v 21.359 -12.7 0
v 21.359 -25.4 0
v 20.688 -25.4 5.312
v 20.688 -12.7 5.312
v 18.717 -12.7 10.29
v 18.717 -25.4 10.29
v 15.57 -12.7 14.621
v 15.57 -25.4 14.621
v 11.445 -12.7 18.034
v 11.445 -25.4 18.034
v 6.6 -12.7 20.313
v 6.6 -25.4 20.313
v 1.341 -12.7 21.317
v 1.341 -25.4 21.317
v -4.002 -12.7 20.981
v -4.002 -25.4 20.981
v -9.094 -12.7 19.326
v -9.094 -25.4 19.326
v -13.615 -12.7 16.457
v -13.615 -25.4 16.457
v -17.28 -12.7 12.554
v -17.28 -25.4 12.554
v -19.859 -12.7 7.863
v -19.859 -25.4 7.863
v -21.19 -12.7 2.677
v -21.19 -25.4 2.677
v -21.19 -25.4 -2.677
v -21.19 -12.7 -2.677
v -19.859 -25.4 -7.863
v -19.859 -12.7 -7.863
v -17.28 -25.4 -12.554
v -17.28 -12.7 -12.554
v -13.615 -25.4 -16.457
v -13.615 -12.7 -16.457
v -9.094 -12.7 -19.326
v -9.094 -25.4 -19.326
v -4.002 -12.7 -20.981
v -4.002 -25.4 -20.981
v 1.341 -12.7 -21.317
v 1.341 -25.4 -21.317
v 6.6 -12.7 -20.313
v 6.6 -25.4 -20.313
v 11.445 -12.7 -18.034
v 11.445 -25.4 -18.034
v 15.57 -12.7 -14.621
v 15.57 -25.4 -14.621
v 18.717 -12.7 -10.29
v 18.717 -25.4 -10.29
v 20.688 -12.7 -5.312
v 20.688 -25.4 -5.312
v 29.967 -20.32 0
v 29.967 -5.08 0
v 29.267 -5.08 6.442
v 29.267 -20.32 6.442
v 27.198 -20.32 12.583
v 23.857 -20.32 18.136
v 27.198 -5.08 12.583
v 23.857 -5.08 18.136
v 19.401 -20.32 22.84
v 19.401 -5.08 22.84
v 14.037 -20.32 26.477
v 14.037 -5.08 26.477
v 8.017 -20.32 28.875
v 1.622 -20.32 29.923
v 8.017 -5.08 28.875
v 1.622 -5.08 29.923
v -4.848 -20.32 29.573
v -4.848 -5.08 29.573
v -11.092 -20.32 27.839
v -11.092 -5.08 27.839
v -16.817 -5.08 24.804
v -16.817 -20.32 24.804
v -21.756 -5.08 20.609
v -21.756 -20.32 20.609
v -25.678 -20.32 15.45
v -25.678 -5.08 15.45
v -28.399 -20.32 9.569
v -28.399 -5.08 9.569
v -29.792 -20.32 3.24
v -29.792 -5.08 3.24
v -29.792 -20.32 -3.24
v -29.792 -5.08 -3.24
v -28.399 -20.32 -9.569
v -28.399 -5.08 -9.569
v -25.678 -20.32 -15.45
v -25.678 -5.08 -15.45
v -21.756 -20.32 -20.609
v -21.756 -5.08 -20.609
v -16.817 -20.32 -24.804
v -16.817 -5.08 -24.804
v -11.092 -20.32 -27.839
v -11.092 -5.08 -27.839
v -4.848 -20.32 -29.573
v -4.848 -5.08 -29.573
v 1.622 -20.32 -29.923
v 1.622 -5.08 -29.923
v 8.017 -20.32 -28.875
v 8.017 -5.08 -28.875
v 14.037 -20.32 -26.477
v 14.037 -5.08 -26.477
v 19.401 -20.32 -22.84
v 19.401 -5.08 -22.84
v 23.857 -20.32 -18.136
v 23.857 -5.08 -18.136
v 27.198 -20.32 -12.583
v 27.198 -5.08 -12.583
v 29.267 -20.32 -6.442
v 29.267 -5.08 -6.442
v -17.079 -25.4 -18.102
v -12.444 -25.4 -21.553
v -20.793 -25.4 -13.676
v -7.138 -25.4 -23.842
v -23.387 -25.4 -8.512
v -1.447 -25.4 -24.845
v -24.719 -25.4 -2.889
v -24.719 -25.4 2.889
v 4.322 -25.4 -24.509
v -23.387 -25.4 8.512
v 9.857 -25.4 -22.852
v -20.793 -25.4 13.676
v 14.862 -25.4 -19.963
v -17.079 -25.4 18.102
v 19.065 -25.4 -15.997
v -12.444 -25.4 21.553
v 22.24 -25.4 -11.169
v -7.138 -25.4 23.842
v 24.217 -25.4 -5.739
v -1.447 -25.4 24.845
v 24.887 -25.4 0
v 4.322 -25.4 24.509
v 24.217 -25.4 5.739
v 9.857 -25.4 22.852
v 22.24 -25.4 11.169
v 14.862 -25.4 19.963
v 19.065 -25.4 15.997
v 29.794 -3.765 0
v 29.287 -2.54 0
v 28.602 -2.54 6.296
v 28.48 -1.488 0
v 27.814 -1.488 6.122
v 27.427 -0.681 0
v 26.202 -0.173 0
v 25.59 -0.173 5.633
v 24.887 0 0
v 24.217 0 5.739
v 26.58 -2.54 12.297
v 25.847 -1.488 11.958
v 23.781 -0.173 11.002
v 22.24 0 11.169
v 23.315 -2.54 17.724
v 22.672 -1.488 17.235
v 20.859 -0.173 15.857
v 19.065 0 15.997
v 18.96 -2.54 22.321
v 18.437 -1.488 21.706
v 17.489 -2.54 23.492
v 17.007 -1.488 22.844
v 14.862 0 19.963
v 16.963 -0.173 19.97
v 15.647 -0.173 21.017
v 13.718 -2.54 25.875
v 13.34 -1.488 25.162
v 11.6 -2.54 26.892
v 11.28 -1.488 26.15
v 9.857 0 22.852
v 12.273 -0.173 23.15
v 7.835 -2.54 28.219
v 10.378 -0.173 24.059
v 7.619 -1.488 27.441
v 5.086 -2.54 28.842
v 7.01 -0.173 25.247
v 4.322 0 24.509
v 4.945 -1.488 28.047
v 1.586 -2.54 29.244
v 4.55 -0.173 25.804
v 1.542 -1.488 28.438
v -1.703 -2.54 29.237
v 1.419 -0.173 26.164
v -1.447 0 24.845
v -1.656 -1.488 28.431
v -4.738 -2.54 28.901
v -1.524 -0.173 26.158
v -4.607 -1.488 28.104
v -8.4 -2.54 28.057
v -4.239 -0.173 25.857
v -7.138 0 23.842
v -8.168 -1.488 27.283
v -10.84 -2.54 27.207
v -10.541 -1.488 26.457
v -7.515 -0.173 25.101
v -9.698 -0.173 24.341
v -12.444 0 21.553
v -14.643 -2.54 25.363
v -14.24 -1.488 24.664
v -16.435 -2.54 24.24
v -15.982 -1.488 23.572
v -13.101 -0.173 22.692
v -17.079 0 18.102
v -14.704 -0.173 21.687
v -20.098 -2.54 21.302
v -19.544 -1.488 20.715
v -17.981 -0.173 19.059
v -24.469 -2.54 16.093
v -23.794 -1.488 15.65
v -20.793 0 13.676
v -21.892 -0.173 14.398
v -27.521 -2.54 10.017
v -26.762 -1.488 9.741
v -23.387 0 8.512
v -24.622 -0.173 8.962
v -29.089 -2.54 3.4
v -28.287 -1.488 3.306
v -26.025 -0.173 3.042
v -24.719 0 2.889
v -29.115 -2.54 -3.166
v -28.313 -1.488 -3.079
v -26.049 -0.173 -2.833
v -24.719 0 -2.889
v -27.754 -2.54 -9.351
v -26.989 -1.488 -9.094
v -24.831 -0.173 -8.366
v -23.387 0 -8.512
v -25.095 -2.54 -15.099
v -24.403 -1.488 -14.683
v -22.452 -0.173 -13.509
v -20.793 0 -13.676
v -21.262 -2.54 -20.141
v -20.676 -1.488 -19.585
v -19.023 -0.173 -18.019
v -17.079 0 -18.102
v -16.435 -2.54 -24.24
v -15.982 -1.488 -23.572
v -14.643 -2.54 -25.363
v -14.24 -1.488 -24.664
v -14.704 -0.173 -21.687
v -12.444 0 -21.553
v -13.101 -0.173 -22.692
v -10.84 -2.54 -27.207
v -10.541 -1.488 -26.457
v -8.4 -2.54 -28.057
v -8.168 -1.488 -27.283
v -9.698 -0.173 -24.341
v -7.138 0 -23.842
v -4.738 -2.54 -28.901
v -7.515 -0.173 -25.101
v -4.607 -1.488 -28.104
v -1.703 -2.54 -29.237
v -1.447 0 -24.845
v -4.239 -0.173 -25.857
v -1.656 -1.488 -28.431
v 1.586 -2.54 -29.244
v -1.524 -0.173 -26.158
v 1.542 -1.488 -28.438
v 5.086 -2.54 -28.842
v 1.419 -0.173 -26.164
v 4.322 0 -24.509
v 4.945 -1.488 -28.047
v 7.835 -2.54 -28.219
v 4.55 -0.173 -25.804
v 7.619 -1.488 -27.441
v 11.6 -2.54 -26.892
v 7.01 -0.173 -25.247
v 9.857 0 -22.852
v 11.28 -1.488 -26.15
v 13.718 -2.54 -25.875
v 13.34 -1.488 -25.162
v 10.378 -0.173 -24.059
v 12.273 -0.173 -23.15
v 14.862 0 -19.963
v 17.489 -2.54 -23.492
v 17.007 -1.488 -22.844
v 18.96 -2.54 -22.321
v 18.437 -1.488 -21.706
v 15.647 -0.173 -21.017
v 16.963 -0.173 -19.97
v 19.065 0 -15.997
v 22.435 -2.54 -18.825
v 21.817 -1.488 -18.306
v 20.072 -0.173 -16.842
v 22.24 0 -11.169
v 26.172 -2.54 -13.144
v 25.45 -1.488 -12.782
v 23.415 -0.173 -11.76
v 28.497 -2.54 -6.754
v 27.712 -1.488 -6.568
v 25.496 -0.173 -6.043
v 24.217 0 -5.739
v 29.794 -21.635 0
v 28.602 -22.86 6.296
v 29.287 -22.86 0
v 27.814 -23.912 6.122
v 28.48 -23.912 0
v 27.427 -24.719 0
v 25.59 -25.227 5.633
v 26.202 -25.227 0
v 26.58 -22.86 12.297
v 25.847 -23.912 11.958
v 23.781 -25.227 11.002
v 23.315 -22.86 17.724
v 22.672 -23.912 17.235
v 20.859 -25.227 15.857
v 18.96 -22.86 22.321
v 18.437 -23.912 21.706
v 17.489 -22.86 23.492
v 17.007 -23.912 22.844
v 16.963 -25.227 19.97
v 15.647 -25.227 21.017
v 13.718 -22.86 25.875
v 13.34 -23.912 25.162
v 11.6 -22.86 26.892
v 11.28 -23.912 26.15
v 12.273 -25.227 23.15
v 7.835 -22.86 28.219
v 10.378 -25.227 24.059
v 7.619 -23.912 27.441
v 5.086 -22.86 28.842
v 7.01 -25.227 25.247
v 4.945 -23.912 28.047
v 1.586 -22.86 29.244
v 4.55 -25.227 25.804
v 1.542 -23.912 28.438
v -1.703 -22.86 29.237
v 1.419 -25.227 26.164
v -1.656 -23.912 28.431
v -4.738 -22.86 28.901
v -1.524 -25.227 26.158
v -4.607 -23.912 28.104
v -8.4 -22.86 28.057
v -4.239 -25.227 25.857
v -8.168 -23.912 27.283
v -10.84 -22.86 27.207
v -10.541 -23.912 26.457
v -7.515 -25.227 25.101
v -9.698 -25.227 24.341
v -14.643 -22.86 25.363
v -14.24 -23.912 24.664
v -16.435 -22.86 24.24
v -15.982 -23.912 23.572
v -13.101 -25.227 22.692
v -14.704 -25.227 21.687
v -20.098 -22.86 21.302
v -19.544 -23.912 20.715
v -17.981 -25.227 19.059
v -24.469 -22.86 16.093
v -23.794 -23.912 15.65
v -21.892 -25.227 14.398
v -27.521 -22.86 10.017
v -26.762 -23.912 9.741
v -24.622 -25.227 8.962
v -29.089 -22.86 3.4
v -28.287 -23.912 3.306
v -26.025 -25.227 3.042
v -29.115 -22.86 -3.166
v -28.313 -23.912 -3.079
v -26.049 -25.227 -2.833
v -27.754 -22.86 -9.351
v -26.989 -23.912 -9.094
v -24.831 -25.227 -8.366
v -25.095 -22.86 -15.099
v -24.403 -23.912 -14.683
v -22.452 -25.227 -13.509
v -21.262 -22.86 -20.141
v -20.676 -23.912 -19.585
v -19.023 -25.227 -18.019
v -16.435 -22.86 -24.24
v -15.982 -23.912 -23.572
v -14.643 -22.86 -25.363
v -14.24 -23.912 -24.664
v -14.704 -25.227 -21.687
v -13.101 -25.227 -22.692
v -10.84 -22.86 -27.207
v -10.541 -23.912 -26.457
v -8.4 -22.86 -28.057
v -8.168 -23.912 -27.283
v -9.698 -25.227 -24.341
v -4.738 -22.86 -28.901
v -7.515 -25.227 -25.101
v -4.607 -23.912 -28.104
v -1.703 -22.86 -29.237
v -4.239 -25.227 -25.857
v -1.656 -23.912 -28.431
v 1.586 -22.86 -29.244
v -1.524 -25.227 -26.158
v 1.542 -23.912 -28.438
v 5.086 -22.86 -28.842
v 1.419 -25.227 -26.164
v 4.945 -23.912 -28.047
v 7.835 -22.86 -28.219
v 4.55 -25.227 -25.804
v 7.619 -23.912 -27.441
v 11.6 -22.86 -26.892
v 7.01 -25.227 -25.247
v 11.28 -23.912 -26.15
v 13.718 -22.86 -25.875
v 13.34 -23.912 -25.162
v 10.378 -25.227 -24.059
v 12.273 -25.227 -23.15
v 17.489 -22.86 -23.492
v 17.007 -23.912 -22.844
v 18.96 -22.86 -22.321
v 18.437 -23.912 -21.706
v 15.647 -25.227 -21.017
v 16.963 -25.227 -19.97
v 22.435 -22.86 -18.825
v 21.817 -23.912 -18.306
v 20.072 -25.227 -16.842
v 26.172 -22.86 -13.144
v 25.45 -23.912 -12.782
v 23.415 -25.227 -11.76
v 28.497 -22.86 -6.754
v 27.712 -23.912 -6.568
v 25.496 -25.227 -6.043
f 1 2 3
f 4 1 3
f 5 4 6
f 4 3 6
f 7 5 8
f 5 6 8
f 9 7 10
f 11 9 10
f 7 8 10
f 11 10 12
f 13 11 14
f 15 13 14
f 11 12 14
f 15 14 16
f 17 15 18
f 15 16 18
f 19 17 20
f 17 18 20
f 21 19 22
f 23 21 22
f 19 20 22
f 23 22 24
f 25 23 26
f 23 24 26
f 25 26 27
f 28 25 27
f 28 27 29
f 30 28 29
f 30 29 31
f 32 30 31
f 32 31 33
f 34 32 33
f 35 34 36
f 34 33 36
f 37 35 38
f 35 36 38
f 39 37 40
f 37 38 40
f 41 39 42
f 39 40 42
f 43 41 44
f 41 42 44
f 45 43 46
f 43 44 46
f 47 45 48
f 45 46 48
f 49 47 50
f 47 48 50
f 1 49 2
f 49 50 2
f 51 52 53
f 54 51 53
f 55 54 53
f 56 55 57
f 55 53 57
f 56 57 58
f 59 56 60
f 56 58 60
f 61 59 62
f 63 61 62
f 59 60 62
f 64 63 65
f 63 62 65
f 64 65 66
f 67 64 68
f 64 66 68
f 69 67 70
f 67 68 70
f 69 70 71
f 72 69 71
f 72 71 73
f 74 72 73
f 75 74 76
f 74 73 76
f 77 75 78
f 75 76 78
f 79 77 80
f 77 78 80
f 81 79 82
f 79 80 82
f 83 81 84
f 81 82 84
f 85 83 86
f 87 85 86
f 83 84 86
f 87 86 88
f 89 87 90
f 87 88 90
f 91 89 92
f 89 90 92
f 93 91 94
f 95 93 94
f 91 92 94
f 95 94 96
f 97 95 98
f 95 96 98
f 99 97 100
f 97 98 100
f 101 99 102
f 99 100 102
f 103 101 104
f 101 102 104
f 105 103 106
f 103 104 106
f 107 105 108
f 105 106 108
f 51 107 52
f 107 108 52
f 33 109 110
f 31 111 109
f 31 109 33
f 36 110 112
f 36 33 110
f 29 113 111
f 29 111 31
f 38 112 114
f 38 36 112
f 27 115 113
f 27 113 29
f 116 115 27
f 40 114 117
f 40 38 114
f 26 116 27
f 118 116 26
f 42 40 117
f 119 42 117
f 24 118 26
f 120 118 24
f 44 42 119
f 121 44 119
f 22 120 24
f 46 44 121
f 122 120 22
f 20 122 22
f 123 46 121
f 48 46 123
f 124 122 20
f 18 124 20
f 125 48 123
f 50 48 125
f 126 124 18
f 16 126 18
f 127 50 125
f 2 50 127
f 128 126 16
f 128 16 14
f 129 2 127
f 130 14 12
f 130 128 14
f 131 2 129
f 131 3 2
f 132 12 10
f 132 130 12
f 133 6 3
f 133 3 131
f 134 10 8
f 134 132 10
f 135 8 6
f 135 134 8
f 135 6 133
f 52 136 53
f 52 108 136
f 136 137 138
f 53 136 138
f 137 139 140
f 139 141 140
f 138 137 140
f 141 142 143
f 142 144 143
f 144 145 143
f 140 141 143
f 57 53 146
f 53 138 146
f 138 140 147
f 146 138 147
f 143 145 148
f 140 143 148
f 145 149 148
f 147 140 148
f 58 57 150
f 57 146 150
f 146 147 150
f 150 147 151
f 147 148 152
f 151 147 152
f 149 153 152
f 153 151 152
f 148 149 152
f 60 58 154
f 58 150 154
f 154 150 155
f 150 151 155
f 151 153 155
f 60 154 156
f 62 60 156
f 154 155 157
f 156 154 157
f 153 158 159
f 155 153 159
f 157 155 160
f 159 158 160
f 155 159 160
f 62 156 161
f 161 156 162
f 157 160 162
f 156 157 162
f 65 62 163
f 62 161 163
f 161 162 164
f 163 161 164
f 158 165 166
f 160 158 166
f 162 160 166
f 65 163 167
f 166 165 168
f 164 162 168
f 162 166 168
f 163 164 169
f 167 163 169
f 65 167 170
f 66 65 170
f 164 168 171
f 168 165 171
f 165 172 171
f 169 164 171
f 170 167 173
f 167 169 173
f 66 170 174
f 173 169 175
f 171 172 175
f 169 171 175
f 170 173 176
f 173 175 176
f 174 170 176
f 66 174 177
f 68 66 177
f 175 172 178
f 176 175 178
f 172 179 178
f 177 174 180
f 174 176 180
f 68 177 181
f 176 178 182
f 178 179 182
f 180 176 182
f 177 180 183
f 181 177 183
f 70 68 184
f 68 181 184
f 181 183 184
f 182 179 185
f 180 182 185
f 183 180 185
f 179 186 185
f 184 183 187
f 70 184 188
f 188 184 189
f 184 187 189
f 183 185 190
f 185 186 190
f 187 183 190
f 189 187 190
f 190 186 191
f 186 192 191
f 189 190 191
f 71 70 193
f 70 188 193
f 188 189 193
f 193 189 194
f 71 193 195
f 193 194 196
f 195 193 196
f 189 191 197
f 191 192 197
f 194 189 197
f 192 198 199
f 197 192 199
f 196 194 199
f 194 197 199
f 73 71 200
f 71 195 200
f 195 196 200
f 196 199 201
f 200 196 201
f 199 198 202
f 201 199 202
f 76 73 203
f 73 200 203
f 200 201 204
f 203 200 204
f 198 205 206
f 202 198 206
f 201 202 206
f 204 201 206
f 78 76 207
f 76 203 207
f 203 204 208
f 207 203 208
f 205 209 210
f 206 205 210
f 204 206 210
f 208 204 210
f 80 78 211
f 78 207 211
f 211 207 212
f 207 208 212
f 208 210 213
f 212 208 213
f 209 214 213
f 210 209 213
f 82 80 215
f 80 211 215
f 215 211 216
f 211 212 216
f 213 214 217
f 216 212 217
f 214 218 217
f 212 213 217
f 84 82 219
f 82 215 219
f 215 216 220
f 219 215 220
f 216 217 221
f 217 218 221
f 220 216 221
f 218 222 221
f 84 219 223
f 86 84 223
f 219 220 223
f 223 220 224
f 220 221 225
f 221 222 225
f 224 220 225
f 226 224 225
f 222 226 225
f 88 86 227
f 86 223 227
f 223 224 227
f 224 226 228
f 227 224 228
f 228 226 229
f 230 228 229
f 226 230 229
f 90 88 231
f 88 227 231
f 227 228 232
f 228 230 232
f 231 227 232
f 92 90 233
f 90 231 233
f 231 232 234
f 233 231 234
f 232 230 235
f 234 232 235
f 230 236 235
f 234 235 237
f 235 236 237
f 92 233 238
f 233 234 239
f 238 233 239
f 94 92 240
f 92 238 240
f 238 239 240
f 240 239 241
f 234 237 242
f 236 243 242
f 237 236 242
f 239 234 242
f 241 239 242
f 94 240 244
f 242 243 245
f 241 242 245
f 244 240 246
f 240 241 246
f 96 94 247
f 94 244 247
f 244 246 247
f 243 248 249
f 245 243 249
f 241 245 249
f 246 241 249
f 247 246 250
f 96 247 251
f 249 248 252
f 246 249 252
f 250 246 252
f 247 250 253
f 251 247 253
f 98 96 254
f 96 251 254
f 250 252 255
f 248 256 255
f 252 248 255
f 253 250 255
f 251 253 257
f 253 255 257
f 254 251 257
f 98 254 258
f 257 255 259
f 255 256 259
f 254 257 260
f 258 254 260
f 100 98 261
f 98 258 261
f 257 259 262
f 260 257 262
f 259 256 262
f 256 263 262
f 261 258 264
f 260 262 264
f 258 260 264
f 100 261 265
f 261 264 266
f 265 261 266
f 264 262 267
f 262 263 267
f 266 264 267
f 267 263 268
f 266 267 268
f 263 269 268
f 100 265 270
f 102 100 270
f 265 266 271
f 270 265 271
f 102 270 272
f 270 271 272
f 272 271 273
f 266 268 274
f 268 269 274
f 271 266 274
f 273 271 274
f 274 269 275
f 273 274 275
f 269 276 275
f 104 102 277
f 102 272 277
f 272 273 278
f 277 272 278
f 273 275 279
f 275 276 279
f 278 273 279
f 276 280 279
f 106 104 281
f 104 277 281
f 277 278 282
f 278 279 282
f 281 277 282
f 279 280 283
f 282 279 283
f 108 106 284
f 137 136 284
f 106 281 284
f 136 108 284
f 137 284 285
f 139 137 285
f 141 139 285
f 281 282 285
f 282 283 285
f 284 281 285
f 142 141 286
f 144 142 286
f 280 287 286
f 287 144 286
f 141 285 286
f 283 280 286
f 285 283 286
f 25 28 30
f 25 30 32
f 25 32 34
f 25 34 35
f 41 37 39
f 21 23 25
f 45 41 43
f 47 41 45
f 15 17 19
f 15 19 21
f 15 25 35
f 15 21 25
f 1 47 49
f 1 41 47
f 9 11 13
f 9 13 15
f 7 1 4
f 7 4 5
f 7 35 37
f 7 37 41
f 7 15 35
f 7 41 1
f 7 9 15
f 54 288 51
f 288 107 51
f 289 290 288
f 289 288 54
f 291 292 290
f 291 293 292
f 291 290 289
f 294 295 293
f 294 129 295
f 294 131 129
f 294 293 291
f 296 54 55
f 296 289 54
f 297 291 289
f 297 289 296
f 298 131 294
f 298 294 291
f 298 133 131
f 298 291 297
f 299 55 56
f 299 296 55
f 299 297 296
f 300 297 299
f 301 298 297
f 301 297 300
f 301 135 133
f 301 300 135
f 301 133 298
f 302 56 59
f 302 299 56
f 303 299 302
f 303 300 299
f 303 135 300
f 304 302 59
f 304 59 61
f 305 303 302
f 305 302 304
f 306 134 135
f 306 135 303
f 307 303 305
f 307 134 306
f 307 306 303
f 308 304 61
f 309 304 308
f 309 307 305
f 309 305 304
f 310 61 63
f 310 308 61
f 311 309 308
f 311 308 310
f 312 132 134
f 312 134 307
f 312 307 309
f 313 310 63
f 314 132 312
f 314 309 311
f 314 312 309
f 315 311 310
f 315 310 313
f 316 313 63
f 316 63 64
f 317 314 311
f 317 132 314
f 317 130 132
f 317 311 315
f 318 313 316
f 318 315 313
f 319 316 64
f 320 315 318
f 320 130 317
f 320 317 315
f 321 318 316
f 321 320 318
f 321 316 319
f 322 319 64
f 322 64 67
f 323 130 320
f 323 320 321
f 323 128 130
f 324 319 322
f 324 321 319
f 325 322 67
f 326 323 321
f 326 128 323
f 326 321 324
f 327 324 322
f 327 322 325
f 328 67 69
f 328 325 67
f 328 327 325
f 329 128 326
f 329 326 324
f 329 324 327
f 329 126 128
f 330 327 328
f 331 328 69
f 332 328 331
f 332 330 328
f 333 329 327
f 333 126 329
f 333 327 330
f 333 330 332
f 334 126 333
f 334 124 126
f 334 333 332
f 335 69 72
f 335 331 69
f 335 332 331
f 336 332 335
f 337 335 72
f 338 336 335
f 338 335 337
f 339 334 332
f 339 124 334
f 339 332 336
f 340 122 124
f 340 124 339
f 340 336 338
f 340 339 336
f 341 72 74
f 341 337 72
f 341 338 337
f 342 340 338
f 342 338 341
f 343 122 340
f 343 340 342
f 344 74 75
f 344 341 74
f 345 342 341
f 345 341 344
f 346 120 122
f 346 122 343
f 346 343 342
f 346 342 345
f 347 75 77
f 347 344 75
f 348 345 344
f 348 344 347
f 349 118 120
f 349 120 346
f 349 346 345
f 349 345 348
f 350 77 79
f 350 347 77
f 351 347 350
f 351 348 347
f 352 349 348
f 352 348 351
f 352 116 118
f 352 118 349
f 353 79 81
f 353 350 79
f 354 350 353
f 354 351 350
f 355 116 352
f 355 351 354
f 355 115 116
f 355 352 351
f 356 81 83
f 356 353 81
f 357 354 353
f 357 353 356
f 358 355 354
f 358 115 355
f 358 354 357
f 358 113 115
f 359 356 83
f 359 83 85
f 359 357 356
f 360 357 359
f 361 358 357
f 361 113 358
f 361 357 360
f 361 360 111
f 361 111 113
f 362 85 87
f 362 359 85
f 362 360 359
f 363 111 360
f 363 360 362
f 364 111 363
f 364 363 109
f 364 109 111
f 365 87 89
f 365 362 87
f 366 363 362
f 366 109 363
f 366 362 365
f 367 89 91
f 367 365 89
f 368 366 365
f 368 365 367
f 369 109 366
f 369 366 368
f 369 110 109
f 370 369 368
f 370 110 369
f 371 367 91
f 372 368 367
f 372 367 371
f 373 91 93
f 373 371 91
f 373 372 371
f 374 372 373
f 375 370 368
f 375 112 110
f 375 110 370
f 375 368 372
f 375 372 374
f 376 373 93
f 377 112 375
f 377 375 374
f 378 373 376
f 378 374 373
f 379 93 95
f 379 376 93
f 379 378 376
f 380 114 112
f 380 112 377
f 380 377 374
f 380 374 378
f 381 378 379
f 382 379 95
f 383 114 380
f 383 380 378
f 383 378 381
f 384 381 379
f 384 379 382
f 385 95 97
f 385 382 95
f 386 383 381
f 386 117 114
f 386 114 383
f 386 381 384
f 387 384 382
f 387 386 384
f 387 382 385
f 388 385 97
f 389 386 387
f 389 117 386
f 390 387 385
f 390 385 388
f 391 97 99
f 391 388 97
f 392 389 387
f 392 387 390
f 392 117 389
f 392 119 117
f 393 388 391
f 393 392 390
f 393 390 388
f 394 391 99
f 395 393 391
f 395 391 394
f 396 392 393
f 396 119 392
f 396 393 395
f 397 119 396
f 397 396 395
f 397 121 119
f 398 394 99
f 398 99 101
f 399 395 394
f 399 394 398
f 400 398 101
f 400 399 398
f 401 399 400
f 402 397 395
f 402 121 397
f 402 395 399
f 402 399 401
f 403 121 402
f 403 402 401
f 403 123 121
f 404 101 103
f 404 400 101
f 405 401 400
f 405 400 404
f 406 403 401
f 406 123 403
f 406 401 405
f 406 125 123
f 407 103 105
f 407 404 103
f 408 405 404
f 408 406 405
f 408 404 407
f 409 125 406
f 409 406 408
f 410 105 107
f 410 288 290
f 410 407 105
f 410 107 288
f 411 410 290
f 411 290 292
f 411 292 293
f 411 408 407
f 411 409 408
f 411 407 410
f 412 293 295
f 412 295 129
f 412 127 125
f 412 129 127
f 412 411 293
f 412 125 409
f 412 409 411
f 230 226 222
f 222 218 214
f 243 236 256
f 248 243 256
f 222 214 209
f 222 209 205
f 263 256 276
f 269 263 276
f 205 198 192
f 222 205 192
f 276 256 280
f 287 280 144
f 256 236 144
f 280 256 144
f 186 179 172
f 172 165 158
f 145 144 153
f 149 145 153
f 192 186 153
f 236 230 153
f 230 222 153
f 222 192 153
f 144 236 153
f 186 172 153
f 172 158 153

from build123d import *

# Parameters (mm, degrees)
F0_R     = 29.967448
F1_DEPTH = 25.4
F2_R     = 5.08
F3_R     = 21.358851
F4_DEPTH = 12.7


with BuildPart() as f1:
    # F0 (on Front) → F1 (new body)
    with BuildSketch(Plane.XZ):
        Circle(F0_R)
    extrude(amount=F1_DEPTH)

    # F2
    f2_edges = [f1.edges().sort_by_distance(p)[0] for p in [
        (-29.967448, 0, 0),
        (-29.967448, -25.4, 0),
    ]]
    fillet(f2_edges, radius=F2_R)

    # F3 (on face) → F4 (cut, symmetric)
    with BuildSketch(Plane.XZ.offset(25.4)):
        Circle(F3_R)
    extrude(amount=F4_DEPTH, both=True, mode=Mode.SUBTRACT)


solid = f1.part
